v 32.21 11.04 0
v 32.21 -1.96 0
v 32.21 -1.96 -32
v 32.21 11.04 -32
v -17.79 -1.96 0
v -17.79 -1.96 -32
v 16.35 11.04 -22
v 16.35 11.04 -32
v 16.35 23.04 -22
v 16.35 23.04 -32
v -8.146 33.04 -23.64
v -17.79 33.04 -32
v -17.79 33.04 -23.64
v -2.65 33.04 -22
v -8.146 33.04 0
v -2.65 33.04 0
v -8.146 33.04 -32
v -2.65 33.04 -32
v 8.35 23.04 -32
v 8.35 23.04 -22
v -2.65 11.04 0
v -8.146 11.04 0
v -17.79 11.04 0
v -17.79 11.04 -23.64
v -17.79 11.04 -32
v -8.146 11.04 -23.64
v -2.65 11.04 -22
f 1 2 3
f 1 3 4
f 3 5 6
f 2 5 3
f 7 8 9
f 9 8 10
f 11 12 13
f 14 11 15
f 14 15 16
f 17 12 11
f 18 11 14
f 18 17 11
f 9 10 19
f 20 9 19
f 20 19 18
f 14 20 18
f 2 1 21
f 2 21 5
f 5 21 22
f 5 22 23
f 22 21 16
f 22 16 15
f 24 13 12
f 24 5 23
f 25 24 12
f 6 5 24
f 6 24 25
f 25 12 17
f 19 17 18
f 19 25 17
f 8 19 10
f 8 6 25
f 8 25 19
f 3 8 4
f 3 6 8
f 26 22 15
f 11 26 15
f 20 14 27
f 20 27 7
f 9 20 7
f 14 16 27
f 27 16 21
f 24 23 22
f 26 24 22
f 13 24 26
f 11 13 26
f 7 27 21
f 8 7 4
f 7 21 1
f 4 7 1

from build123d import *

# Parameters (mm, degrees)
SKETCH3_W           = 50
SKETCH3_H           = 13
BOSS_EXTRUDE1_DEPTH = 32
BOSS_EXTRUDE2_DEPTH = 32
BOSS_EXTRUDE3_DEPTH = 10
SKETCH8_W           = 9.643905297
SKETCH8_H           = 8.359669373
BOSS_EXTRUDE4_DEPTH = 22


with BuildPart() as part:
    # Sketch3 → Boss-Extrude1 (new body)
    with BuildSketch(Plane.XY):
        with Locations((7.209853726, 4.539889959)):
            Rectangle(SKETCH3_W, SKETCH3_H)
    extrude(amount=-BOSS_EXTRUDE1_DEPTH)

    # Sketch4 → Boss-Extrude2 (add)
    with BuildSketch(Plane.XY):
        Polygon((-8.146240977, 11.039889959), (-8.146240977, 33.039889959), (-2.650375504, 33.039889959), (-2.650375504, 11.039889959), (32.209853726, 11.039889959), (32.209853726, -1.960110041), (-17.790146274, -1.960110041), (-17.790146274, 11.039889959), align=None)
    extrude(amount=-BOSS_EXTRUDE2_DEPTH)

    # Sketch5 → Boss-Extrude3 (add)
    with BuildSketch(Plane(origin=(0, 0, -32), x_dir=(-1, 0, 0), z_dir=(0, 0, -1))):
        Polygon((-16.349624496, 11.039889959), (-16.349624496, 23.039889959), (-8.349624496, 23.039889959), (2.650375504, 33.039889959), (2.650375504, 11.039889959), align=None)
    extrude(amount=-BOSS_EXTRUDE3_DEPTH)

    # Sketch8 → Boss-Extrude4 (add)
    with BuildSketch(Plane(origin=(0, 11.039889959, 0), x_dir=(1, 0, 0), z_dir=(0, 1, 0))):
        with Locations((-12.968193625, 27.820165313)):
            Rectangle(SKETCH8_W, SKETCH8_H)
    extrude(amount=BOSS_EXTRUDE4_DEPTH)


solid = part.part
